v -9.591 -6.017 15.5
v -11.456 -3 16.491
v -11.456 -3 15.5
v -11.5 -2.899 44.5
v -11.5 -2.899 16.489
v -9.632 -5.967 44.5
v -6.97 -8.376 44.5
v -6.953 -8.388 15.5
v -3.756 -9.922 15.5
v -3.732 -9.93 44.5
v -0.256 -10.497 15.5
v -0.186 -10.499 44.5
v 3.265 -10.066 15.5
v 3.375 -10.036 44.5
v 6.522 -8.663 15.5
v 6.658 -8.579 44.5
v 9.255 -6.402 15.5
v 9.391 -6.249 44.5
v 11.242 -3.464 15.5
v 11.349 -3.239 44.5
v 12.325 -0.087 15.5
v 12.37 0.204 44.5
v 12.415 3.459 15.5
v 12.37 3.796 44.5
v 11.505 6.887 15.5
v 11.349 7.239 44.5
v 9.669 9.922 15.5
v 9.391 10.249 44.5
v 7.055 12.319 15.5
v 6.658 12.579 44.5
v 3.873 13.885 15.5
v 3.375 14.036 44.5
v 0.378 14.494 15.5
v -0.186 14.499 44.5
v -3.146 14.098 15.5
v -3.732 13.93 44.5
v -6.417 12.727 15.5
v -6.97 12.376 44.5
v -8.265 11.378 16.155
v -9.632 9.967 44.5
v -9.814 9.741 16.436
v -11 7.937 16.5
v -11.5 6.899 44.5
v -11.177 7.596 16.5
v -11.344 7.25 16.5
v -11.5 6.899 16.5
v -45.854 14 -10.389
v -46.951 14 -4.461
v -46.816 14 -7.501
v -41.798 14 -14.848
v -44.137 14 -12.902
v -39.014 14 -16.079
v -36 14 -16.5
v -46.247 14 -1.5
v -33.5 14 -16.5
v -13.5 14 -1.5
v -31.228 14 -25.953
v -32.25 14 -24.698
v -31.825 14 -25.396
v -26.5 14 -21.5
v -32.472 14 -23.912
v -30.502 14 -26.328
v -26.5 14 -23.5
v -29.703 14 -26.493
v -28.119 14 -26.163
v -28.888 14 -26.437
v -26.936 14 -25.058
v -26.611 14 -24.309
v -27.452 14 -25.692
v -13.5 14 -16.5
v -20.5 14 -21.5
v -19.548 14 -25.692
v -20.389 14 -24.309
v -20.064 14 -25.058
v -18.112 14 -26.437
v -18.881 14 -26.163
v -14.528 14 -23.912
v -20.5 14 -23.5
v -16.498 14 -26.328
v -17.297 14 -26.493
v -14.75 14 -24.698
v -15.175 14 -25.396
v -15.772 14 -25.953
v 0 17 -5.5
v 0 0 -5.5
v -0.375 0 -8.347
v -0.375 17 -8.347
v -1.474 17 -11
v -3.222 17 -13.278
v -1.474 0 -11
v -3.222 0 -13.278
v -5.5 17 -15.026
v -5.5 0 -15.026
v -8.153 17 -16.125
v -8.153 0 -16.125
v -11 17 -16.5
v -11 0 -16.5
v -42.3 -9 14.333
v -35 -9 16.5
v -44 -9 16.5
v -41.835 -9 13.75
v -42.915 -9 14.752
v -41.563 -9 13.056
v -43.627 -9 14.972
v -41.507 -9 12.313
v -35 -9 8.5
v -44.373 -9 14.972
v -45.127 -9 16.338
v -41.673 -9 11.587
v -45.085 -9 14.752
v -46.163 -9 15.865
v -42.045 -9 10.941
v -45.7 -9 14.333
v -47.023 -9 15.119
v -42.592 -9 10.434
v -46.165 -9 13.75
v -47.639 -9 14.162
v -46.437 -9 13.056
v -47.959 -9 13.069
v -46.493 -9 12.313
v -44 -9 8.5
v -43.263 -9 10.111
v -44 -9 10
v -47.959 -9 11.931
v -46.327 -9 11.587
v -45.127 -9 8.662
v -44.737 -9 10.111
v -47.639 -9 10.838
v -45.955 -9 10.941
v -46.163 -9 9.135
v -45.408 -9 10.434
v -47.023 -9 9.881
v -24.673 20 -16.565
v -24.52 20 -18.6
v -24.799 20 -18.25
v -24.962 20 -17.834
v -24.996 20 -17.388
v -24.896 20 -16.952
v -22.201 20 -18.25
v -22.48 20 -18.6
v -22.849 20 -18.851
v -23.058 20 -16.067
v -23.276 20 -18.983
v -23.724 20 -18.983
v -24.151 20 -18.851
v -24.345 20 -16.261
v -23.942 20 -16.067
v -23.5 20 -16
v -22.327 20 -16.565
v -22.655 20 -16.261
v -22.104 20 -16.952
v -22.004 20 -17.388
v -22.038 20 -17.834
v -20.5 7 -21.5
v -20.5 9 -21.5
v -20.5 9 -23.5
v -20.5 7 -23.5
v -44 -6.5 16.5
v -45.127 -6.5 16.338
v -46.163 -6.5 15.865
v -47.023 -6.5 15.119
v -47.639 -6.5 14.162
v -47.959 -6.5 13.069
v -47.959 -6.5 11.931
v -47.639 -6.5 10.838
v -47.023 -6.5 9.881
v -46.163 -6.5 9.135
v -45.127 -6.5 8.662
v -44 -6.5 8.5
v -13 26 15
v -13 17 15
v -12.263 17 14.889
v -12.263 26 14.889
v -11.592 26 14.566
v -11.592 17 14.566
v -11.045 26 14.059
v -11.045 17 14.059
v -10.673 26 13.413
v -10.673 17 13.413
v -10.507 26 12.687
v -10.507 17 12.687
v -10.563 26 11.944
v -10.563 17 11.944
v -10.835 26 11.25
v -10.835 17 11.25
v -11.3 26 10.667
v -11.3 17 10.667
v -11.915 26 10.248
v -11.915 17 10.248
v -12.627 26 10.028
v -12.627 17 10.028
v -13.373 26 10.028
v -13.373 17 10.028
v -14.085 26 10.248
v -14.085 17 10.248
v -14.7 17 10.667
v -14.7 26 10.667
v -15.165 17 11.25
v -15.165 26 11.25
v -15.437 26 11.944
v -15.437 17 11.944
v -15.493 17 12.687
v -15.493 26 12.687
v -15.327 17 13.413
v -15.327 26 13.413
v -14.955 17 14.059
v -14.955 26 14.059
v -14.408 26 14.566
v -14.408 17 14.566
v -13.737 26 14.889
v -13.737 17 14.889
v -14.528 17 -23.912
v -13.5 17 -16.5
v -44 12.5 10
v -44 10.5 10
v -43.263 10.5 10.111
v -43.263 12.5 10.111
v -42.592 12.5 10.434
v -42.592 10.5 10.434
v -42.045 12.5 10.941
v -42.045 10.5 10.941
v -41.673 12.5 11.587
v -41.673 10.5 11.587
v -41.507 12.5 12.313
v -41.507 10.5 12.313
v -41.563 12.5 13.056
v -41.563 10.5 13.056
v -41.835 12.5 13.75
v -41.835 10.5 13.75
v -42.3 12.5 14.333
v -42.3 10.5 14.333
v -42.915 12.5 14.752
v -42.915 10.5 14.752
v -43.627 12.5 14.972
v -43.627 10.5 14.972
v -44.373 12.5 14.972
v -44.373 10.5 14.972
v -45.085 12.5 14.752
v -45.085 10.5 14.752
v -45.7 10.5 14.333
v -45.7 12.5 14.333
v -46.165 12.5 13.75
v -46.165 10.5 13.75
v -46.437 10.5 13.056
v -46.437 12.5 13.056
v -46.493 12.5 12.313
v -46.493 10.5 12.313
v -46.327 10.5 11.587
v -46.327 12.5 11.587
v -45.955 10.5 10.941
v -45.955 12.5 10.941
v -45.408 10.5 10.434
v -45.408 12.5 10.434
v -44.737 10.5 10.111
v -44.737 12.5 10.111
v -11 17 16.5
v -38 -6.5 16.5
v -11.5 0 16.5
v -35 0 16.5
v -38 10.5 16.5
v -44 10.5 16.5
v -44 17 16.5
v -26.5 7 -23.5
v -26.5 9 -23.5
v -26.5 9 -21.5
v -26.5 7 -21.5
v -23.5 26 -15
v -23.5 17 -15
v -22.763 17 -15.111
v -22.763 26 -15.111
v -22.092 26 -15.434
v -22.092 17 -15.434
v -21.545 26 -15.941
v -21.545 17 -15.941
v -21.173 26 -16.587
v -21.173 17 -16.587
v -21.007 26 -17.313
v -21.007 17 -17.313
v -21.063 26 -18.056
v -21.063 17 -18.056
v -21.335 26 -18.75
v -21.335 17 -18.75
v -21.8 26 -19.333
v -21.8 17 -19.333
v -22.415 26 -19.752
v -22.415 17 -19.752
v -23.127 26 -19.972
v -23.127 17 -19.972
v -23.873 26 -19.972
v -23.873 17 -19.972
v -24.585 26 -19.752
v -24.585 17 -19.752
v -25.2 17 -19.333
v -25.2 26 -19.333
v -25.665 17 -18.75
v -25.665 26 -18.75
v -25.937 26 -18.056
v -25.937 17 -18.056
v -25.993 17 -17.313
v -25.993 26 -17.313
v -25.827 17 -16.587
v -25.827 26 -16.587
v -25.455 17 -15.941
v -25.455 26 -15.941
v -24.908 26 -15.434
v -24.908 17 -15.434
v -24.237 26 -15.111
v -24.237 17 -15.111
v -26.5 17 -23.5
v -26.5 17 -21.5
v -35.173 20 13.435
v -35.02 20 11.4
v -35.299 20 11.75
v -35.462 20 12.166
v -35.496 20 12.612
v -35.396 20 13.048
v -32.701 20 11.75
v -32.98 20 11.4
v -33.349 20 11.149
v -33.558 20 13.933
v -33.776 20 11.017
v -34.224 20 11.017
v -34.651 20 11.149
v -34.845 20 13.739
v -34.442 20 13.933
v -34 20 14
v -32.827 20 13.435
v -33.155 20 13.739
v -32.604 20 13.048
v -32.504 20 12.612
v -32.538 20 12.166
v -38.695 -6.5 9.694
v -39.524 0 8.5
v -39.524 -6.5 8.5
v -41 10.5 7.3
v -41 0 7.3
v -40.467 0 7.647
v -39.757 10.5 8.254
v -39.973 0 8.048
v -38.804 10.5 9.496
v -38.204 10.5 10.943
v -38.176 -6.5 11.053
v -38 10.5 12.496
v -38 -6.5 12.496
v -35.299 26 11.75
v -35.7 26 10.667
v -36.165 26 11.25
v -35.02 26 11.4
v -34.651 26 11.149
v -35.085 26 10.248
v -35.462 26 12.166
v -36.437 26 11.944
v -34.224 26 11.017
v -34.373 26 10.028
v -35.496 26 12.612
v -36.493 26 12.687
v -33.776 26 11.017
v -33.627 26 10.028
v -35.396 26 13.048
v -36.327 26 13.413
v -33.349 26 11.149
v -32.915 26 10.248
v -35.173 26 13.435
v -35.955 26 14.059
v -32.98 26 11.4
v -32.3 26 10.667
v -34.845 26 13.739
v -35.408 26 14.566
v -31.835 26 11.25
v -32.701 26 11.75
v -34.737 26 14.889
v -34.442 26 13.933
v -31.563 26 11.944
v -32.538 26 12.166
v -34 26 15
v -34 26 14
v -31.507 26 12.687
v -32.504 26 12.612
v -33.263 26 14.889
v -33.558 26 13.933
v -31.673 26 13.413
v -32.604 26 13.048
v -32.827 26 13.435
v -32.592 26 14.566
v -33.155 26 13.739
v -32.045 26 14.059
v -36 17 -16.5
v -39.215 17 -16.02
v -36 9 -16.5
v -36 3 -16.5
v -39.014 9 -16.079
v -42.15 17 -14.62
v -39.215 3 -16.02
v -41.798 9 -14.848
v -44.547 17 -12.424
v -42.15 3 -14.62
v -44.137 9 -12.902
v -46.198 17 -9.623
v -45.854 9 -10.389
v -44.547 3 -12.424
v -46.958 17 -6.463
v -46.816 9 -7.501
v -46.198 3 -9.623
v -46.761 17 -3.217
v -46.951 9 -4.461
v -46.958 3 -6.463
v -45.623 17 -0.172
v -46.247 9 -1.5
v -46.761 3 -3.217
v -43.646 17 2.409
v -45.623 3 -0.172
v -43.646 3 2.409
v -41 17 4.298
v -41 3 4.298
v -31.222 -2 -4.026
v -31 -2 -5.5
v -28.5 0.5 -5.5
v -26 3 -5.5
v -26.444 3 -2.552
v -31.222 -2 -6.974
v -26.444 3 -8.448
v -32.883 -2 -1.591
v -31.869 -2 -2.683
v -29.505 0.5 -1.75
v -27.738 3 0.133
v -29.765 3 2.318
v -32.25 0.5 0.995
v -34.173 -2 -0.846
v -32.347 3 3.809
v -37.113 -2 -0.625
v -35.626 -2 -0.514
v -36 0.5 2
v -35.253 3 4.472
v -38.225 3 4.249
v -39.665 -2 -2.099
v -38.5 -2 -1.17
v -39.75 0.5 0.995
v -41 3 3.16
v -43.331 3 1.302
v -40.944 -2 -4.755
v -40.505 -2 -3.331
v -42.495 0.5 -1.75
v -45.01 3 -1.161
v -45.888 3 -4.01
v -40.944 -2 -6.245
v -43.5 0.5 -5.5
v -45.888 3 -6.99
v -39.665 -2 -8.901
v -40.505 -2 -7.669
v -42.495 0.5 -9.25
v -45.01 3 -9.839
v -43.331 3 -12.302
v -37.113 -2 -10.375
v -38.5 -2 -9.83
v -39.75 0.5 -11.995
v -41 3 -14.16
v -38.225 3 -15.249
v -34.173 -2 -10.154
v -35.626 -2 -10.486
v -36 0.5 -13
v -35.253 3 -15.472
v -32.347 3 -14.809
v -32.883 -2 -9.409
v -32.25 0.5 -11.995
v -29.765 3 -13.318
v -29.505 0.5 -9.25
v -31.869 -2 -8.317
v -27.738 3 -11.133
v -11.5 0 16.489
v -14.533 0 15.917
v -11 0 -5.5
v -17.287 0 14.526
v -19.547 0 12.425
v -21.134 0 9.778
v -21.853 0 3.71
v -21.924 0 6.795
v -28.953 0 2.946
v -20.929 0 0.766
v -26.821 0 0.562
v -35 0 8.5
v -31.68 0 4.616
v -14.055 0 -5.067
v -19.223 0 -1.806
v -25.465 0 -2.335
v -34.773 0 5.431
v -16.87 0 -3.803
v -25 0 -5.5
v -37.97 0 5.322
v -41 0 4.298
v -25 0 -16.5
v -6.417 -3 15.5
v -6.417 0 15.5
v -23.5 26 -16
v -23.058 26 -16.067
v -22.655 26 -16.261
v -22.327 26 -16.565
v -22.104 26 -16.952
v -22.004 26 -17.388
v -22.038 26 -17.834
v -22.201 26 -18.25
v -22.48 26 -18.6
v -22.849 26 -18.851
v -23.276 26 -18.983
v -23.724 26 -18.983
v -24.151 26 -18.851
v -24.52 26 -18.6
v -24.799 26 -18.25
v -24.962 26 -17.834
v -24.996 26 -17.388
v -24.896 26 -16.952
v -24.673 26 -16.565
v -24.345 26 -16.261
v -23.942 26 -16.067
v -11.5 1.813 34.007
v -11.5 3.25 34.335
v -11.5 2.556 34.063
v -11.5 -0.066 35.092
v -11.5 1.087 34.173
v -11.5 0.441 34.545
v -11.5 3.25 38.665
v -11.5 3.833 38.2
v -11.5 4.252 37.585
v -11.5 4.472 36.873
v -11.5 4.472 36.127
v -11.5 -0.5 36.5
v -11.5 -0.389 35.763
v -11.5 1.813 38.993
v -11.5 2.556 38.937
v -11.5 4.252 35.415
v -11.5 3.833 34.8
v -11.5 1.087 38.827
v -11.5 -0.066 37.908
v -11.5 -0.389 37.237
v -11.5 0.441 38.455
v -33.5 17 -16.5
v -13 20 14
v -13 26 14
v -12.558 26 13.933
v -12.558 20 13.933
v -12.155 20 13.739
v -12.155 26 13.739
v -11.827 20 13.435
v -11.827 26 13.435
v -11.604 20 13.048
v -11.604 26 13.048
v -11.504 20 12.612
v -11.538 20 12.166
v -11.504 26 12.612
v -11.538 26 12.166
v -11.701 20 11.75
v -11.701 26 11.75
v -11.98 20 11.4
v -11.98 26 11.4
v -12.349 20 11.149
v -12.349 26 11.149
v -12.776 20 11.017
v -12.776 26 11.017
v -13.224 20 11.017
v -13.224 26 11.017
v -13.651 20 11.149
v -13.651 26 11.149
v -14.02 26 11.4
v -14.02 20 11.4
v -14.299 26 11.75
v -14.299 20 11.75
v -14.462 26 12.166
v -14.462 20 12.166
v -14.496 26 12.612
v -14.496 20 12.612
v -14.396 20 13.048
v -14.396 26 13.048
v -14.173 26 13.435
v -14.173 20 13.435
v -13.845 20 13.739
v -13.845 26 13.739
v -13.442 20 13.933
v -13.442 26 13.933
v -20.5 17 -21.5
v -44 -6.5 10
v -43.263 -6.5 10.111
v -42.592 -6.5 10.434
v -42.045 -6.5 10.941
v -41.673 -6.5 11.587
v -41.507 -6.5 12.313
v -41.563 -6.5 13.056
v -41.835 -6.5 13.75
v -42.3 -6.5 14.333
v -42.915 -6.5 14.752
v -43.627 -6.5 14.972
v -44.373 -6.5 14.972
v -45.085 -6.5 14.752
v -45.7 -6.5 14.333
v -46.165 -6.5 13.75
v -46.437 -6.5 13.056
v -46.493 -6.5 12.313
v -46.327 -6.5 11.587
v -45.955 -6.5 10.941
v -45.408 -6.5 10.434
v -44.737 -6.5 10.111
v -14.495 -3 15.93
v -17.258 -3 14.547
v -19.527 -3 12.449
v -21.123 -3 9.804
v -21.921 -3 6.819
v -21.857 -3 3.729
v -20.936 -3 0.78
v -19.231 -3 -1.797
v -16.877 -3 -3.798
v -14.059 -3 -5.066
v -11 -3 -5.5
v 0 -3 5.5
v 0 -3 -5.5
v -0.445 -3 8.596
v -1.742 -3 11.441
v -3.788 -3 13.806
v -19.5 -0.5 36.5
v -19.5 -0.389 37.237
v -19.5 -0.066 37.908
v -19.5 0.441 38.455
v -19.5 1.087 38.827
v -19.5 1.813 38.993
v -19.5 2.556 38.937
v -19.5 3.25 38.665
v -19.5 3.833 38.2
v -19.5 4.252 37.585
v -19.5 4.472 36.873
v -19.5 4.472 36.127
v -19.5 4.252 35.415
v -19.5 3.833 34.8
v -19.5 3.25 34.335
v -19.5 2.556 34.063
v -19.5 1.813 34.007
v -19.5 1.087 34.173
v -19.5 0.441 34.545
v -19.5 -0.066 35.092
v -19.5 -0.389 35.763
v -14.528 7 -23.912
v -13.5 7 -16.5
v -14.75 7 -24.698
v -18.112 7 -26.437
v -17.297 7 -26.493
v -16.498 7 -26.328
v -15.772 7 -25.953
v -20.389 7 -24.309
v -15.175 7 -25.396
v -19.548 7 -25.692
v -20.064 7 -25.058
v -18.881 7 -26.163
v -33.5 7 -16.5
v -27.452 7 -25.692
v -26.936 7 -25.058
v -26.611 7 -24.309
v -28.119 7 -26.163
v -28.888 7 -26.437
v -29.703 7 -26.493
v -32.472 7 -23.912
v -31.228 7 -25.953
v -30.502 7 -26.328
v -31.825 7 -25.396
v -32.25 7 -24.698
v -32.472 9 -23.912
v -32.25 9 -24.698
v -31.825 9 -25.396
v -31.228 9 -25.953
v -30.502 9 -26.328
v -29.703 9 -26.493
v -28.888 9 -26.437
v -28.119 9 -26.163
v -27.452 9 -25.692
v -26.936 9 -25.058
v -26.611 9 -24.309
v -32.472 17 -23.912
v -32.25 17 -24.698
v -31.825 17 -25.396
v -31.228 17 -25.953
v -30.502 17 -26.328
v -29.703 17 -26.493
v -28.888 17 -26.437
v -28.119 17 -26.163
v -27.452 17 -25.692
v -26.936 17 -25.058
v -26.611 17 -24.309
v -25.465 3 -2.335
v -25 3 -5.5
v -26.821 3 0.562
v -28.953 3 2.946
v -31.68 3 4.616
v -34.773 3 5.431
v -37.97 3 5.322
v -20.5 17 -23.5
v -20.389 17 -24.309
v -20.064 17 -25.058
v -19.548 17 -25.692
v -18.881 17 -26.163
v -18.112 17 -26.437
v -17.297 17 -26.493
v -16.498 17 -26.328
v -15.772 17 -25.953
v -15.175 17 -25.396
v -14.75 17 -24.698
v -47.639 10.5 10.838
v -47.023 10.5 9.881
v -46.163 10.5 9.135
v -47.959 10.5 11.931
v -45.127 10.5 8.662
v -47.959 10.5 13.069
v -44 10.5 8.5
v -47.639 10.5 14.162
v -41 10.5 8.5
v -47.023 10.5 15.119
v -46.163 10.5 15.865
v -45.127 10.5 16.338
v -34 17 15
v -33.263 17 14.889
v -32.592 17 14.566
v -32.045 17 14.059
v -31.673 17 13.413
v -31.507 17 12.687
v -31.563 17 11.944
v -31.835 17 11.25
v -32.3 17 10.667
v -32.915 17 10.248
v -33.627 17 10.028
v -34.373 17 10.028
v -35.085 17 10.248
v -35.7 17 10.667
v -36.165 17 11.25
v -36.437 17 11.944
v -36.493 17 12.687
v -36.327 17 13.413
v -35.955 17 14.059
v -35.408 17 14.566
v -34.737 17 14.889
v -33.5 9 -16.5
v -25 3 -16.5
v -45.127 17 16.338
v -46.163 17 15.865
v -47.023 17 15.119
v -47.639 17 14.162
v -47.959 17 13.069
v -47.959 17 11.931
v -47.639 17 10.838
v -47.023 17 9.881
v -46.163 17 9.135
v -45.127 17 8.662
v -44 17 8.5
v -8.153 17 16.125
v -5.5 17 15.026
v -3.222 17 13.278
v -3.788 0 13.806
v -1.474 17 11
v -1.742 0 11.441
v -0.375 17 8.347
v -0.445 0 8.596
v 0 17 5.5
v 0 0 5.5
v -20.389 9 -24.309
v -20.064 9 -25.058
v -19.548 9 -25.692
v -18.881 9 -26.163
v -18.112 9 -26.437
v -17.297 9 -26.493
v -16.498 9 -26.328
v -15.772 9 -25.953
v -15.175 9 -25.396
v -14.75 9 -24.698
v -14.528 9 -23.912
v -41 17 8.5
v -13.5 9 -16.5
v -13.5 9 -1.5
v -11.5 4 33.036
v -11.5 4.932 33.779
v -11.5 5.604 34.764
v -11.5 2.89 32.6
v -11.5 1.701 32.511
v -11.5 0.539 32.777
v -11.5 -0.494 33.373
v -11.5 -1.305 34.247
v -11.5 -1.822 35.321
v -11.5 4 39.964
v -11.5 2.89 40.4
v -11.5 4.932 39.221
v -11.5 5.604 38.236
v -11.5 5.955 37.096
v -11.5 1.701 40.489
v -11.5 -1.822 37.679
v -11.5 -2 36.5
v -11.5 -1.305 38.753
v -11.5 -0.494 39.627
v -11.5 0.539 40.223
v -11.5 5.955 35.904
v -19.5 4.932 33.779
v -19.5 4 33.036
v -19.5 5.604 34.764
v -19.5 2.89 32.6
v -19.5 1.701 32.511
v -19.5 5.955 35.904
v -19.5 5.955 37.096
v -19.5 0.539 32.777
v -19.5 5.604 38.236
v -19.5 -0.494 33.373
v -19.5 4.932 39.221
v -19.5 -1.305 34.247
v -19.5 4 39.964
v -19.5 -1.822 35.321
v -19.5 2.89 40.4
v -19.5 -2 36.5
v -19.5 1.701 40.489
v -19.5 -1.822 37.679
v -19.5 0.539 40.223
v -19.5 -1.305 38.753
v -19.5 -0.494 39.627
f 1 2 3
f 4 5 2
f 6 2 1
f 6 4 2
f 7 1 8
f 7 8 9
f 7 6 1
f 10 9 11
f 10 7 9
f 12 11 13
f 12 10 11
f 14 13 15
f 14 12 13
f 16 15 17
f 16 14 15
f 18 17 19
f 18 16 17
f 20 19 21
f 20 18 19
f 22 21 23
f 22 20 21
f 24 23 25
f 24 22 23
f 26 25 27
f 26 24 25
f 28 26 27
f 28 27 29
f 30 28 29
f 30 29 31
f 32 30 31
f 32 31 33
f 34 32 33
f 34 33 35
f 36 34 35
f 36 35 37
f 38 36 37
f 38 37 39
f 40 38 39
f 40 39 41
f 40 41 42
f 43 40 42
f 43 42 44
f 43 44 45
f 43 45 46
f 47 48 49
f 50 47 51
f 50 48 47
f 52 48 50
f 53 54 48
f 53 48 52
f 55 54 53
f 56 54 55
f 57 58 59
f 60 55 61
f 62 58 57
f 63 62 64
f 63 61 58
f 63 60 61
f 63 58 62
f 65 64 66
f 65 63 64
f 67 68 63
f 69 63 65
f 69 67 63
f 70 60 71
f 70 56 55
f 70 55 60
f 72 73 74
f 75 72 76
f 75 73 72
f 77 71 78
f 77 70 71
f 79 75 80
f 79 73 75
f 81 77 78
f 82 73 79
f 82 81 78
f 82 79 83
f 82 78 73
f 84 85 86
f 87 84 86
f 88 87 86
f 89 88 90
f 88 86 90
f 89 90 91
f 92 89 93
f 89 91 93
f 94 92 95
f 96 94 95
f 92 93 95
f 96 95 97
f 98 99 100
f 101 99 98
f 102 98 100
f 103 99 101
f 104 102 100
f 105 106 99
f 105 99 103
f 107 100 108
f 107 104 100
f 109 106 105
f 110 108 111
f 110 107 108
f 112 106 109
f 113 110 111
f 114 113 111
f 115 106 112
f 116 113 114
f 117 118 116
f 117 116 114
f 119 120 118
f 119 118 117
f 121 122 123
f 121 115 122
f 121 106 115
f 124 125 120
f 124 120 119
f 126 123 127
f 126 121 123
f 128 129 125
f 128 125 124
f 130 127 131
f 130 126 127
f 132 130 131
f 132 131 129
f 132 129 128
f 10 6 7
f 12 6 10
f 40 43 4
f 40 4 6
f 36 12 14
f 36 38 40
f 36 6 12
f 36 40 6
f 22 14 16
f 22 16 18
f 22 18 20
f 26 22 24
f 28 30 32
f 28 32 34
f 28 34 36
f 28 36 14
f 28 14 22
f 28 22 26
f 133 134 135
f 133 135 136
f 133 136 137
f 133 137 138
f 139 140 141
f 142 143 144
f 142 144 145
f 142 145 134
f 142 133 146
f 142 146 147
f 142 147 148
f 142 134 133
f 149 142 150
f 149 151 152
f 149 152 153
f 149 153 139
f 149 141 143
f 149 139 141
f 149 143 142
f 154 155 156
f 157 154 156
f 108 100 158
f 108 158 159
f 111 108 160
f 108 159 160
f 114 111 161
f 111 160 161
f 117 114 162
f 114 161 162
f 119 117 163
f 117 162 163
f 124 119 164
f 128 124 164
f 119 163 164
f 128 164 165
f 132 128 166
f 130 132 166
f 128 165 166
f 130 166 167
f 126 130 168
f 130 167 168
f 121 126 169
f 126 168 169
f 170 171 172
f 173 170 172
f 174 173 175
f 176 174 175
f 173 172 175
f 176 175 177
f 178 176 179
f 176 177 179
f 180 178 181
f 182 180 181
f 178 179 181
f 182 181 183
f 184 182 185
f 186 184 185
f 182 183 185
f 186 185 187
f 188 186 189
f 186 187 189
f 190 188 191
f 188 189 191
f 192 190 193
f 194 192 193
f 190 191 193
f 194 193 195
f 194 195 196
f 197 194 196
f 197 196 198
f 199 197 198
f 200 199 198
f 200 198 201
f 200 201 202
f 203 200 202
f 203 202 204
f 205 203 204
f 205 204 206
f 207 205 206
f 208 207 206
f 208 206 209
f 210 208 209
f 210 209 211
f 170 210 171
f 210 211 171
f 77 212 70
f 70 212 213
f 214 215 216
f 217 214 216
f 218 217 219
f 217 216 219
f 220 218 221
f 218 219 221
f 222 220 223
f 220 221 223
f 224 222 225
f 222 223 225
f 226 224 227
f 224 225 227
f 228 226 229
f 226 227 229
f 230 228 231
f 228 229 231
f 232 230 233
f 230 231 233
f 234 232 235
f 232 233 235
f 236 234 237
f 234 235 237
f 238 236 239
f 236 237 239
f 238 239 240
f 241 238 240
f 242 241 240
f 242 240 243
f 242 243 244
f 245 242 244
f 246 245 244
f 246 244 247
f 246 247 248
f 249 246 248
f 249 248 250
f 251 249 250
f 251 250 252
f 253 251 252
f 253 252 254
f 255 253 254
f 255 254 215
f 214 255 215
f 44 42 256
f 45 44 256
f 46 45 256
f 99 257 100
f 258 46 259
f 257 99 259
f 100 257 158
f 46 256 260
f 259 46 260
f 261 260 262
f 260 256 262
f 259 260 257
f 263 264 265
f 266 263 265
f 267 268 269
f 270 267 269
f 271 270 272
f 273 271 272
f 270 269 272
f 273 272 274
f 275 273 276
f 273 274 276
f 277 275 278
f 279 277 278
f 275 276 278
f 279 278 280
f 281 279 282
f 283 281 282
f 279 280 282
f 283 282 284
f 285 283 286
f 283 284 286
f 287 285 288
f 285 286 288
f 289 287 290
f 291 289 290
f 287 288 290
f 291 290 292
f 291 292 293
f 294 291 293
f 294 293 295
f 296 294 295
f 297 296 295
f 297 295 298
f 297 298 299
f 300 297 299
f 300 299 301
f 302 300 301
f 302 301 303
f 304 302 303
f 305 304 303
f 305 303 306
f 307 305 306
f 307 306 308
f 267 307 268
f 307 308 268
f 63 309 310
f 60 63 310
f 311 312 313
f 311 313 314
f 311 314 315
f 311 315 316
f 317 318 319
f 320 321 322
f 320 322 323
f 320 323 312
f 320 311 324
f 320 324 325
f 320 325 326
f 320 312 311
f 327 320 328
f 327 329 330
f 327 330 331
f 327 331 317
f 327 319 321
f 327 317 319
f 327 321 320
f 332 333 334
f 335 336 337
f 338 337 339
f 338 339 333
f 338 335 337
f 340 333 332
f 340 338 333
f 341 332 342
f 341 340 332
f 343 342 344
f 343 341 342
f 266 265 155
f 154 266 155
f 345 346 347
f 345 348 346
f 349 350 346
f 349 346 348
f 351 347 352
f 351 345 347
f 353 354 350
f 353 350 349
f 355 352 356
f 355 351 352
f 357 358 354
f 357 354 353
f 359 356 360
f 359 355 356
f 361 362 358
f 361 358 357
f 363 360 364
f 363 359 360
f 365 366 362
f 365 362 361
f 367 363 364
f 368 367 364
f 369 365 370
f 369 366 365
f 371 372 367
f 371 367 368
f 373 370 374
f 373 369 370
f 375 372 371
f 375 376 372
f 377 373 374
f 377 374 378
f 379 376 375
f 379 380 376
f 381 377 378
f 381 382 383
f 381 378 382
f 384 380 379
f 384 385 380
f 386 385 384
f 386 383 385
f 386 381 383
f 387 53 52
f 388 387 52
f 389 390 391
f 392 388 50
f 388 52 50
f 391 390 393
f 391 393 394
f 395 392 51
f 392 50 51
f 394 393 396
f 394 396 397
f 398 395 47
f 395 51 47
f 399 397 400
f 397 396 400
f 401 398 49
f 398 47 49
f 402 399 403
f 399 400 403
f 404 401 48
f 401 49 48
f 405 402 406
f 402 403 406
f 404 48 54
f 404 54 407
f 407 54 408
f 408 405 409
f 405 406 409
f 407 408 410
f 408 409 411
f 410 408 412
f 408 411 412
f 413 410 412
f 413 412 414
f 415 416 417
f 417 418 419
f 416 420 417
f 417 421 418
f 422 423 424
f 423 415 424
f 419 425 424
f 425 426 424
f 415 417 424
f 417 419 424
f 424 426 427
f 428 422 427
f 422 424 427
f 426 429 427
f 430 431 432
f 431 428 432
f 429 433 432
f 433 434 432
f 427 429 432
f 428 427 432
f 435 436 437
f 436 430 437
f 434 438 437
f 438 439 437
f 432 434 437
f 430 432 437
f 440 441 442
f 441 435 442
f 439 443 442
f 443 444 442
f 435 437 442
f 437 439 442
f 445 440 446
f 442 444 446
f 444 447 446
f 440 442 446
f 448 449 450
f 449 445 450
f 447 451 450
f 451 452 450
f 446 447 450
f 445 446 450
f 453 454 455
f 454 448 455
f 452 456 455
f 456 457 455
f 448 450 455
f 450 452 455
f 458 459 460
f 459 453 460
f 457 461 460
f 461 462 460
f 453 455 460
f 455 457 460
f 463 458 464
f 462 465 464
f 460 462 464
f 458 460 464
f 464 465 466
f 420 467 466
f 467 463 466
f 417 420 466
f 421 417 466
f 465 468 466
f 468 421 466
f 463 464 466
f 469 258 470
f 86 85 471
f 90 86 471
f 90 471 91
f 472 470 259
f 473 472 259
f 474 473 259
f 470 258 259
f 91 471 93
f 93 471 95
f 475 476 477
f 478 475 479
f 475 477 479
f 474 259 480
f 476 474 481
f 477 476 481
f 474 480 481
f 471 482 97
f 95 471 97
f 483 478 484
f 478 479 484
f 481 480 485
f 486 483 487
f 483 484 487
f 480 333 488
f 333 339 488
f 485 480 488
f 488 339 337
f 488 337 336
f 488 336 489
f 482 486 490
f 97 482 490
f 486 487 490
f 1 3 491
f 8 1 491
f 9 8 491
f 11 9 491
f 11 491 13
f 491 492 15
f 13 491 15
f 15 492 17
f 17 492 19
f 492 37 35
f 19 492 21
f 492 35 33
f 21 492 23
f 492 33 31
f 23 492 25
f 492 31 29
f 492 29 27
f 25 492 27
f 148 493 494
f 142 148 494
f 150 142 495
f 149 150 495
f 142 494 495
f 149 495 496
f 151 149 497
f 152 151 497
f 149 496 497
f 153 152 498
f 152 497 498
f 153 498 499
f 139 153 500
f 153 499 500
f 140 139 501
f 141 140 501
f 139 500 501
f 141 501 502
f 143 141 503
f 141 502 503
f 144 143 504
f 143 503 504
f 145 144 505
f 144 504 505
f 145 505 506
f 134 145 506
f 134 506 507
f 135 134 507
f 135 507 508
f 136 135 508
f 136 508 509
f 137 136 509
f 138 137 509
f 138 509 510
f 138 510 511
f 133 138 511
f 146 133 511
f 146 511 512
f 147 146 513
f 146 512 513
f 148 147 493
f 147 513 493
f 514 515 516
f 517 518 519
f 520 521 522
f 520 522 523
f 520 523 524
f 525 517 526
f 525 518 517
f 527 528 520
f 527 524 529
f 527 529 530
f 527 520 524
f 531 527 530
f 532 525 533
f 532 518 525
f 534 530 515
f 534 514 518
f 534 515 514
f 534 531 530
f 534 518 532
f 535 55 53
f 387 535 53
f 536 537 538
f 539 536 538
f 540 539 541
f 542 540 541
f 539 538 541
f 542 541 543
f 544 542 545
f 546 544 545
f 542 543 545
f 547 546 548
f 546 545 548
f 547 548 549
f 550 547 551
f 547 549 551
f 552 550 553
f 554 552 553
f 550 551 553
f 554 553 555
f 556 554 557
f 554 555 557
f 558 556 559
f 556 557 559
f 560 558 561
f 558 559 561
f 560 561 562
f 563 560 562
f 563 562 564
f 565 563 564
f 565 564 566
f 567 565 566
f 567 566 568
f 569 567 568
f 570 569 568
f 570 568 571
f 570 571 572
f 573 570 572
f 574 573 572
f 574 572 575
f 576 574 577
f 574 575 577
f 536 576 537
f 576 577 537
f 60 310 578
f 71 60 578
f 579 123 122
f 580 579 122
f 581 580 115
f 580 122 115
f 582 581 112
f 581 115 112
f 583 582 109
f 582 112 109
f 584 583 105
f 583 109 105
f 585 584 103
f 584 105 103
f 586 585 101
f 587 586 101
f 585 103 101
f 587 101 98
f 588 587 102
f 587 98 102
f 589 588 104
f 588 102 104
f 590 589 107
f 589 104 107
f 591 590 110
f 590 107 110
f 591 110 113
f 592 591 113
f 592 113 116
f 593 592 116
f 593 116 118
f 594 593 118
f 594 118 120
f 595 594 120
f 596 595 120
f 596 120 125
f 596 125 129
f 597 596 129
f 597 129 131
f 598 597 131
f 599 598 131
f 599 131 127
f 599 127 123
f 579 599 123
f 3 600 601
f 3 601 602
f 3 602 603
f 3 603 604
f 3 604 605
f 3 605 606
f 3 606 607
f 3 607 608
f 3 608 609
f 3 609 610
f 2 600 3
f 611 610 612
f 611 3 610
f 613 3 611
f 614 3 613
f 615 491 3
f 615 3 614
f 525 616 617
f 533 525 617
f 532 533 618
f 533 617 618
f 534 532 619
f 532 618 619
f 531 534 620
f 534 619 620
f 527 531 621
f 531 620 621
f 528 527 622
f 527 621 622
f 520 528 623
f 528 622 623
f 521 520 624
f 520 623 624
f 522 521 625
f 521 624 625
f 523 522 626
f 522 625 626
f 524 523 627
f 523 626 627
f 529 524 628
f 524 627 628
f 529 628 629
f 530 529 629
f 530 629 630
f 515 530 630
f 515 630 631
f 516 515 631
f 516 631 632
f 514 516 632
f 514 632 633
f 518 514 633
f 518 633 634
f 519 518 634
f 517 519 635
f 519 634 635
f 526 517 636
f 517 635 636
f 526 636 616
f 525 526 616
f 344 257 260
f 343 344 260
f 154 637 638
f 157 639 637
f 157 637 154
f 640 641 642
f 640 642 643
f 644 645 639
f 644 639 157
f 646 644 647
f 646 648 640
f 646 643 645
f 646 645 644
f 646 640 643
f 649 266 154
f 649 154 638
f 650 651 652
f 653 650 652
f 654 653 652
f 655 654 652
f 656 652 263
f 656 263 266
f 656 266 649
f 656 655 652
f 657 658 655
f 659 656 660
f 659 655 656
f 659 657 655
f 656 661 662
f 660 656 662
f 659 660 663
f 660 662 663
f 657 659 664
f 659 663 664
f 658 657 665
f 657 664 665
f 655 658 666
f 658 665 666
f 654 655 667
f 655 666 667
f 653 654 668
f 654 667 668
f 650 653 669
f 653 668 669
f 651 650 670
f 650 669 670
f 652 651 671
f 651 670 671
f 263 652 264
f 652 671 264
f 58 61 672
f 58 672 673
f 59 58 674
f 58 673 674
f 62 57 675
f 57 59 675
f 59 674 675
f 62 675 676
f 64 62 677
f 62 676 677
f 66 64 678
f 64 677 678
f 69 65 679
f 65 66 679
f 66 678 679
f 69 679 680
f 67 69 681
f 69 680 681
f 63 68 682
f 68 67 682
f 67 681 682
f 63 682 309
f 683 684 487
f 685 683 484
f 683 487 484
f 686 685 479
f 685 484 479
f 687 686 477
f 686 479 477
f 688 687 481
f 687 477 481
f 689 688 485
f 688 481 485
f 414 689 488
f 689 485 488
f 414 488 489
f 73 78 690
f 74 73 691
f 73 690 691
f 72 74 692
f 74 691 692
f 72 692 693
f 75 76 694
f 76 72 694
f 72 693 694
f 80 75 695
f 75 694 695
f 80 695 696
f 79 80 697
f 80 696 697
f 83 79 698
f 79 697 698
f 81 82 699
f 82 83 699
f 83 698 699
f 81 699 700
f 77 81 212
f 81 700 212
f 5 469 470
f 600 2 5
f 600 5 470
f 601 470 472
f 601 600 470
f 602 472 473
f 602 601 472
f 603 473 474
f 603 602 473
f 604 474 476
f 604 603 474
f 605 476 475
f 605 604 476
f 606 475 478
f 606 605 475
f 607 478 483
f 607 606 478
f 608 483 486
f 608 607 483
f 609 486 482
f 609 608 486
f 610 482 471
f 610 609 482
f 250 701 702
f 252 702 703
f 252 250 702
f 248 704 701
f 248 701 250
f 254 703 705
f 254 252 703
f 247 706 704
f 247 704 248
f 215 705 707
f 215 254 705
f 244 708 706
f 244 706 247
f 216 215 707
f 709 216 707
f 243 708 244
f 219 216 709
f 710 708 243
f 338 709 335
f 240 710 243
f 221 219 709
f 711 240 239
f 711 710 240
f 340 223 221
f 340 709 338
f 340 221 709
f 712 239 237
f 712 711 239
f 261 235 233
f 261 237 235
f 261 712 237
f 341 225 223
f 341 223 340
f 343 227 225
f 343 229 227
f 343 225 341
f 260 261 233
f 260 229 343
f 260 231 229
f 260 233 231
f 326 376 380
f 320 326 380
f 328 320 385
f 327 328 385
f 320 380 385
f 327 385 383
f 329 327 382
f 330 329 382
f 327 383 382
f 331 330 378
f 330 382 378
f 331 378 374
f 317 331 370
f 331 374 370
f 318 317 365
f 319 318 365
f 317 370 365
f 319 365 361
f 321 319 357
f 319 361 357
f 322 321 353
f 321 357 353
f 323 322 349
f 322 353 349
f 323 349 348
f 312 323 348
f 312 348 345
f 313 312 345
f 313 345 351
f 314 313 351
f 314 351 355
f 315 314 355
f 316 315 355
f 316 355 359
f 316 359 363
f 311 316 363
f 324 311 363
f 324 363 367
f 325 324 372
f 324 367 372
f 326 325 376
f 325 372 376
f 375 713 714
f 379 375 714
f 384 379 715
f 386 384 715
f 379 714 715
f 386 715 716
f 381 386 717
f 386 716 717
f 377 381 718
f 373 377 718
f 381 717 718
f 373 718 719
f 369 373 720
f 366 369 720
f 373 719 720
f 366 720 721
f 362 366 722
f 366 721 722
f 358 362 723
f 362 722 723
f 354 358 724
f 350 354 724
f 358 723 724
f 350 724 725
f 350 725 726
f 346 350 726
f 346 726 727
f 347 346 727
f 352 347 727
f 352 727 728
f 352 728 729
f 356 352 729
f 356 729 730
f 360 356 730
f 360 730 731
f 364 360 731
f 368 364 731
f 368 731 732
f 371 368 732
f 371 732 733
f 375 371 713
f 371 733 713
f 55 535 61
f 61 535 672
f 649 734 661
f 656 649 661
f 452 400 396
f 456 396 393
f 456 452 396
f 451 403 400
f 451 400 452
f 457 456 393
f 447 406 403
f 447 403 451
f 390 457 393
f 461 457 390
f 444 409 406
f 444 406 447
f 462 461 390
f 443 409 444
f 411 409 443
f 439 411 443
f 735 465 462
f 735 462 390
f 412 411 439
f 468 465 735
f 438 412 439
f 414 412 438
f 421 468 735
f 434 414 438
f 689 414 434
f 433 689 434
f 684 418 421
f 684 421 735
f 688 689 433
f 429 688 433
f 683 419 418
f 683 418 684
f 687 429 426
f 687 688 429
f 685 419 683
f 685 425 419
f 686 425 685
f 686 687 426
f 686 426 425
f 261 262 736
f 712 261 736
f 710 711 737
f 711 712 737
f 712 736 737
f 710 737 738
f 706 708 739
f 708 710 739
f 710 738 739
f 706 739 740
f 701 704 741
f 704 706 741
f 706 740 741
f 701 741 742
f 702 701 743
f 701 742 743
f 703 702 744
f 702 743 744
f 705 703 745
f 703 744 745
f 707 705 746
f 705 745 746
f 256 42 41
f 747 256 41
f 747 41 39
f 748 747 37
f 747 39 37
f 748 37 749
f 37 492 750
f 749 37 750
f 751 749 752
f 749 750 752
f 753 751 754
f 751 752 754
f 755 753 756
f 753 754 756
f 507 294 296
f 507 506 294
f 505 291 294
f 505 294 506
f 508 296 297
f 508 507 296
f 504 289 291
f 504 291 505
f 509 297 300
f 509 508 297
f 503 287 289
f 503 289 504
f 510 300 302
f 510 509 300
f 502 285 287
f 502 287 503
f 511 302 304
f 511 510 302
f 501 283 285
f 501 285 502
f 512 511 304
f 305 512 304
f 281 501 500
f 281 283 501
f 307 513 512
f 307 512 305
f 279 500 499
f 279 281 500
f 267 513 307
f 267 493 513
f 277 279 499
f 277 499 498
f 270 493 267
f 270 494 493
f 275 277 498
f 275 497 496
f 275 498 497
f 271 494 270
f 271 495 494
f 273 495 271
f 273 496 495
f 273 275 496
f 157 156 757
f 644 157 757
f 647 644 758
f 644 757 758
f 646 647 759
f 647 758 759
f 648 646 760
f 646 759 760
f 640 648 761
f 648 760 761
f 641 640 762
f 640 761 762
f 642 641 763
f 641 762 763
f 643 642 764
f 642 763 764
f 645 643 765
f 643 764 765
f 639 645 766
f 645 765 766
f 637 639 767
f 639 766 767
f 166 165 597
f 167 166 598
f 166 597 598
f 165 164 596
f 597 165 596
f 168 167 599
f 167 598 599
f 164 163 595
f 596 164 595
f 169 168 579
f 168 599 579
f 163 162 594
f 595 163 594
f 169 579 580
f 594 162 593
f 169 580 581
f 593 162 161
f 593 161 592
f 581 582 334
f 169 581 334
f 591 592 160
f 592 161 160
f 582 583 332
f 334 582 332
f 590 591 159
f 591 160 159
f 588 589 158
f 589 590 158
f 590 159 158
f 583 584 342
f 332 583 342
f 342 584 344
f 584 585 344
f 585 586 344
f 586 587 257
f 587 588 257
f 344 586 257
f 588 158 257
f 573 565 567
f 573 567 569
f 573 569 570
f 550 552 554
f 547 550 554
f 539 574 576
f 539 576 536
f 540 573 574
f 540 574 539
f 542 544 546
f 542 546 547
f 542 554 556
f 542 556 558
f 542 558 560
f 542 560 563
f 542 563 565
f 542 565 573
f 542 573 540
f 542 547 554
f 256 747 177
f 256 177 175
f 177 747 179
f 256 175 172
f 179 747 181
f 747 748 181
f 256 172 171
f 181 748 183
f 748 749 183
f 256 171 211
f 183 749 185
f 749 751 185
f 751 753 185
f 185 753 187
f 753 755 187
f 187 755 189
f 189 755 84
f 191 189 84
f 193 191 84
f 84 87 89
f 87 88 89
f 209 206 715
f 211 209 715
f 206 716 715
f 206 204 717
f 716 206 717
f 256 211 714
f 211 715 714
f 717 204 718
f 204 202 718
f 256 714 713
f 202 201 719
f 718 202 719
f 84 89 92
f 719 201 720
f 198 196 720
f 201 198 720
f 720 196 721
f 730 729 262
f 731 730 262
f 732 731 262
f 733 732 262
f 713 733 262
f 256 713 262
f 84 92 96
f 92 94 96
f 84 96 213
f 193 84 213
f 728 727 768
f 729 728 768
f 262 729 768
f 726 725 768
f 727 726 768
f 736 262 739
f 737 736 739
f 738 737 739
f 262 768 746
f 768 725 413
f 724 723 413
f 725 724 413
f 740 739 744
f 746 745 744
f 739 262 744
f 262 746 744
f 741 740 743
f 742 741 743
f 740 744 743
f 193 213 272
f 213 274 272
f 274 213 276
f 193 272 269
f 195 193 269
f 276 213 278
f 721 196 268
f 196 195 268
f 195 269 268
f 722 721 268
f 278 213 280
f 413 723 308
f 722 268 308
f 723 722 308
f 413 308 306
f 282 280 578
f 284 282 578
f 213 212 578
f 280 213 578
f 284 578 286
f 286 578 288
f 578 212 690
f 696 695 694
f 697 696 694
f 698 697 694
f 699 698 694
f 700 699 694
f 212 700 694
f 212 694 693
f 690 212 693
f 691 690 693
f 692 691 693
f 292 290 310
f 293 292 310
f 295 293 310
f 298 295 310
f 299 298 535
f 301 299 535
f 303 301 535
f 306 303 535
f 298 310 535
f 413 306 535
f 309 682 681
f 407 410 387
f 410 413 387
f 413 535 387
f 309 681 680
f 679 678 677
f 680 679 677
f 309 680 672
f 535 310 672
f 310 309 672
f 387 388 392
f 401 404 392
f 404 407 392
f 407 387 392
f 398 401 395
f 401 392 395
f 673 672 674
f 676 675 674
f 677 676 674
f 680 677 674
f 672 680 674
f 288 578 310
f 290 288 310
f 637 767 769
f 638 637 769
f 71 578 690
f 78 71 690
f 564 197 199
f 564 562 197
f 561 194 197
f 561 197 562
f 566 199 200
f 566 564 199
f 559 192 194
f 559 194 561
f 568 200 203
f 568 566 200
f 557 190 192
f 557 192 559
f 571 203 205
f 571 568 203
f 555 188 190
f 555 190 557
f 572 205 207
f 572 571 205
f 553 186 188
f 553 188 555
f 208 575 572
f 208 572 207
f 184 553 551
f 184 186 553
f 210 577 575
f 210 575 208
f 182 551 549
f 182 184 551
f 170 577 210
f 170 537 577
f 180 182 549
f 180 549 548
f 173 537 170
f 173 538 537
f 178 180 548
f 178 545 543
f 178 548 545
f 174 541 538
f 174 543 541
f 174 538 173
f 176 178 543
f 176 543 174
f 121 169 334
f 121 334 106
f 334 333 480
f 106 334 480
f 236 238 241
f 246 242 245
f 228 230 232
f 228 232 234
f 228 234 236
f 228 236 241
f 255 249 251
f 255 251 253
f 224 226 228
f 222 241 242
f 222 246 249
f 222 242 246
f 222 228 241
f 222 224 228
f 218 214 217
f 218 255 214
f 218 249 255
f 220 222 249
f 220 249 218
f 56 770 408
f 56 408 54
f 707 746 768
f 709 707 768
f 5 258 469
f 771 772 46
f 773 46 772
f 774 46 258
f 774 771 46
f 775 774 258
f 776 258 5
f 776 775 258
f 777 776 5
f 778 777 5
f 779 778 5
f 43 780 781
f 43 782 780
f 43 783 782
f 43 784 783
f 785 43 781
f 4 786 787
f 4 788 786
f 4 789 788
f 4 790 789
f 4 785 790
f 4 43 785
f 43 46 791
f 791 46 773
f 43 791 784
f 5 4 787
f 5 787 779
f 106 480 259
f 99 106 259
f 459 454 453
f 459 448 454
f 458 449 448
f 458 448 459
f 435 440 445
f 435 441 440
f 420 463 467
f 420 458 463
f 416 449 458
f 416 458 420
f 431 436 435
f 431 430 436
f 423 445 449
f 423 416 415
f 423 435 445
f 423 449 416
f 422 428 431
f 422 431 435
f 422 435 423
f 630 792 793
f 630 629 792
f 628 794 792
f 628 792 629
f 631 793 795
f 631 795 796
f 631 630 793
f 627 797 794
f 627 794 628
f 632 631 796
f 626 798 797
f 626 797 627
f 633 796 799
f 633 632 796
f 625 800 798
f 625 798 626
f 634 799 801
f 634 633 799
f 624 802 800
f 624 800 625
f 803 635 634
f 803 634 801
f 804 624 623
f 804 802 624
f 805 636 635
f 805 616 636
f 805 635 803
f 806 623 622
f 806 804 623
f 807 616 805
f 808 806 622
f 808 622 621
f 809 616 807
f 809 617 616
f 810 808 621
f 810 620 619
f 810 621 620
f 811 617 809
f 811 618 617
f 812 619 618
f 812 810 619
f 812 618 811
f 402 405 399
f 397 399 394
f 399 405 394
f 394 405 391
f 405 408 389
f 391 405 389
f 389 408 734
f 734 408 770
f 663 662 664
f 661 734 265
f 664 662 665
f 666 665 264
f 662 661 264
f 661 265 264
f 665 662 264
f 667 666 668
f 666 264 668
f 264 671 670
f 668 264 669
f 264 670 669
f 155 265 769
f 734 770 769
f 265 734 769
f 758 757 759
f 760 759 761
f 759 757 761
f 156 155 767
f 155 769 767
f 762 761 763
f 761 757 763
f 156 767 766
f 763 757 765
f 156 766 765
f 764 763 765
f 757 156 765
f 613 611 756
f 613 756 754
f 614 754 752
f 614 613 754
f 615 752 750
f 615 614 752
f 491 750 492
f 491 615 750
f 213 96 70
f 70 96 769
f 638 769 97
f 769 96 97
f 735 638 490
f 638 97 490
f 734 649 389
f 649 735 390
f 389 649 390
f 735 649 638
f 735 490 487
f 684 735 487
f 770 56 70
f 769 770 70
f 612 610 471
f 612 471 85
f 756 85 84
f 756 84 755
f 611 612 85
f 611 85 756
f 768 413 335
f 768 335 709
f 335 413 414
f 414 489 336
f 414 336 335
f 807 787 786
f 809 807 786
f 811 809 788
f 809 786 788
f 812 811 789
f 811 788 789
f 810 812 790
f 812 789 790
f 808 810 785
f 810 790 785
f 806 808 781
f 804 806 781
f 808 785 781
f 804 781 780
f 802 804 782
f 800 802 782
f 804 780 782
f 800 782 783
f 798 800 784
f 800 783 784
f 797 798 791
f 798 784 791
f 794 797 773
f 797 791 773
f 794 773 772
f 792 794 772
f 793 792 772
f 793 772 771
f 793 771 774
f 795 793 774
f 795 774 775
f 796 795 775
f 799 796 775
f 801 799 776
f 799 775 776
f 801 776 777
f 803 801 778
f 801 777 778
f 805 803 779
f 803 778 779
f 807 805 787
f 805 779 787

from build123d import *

# Parameters (mm, degrees)
BOSS_EXTRUDE1_DEPTH = 17
BOSS_EXTRUDE2_DEPTH = 10
BOSS_EXTRUDE3_DEPTH = 29
SKETCH6_R           = 4
BOSS_EXTRUDE4_DEPTH = 8
BOSS_EXTRUDE5_DEPTH = 26
SKETCH11_R          = 2.5
BOSS_EXTRUDE6_DEPTH = 9
BOSS_EXTRUDE8_START = 3
BOSS_EXTRUDE8_DEPTH = 3
CUT_EXTRUDE1_DEPTH  = 3
BOSS_EXTRUDE7_START = 2
SKETCH12_R          = 5
BOSS_EXTRUDE7_DEPTH = 5
BOSS_EXTRUDE7_TAPER = -45
SKETCH10_W          = 10
SKETCH10_H          = 17
CUT_EXTRUDE2_DEPTH  = 9.2
CUT_EXTRUDE3_START  = -13.5
SKETCH14_W          = 25
SKETCH14_H          = 5
CUT_EXTRUDE3_DEPTH  = 57.929042368
SKETCH15_R          = 2.5
CUT_EXTRUDE4_DEPTH  = 8
SKETCH16_R          = 1.5
CUT_EXTRUDE5_DEPTH  = 6
SKETCH17_R          = 2.5
CUT_EXTRUDE6_DEPTH  = 21.5
FILLET1_R           = 6


with BuildPart() as part:
    # Sketch1 → Boss-Extrude1 (new body)
    with BuildSketch(Plane(origin=(0, 0, 0), x_dir=(1, 0, 0), z_dir=(0, 1, 0))):
        with BuildLine():
            Line((-11, 16.5), (-36, 16.5))
            ThreePointArc((-36, 16.5), (-46.695268783, 8.071230378), (-41, -4.297958971))
            Line((-41, -4.297958971), (-41, -16.5))
            Line((-41, -16.5), (-11, -16.5))
            ThreePointArc((-11, -16.5), (-3.221825407, -13.278174593), (0, -5.5))
            Line((0, -5.5), (0, 5.5))
            ThreePointArc((0, 5.5), (-3.221825407, 13.278174593), (-11, 16.5))
        make_face()
    extrude(amount=BOSS_EXTRUDE1_DEPTH)

    # Sketch2 → Boss-Extrude2 (add)
    with BuildSketch(Plane(origin=(0, 17, 0), x_dir=(1, 0, 0), z_dir=(0, 1, 0))):
        with BuildLine():
            Line((-33.5, 16.5), (-32.471532465, 23.912304266))
            ThreePointArc((-32.471532465, 23.912304266), (-29.293357066, 26.492874655), (-26.5, 23.5))
            Line((-26.5, 23.5), (-26.5, 21.5))
            Line((-26.5, 21.5), (-20.5, 21.5))
            Line((-20.5, 21.5), (-20.5, 23.5))
            ThreePointArc((-20.5, 23.5), (-17.706642934, 26.492874655), (-14.528467535, 23.912304266))
            Line((-14.528467535, 23.912304266), (-13.5, 16.5))
            Line((-13.5, 16.5), (-33.5, 16.5))
        make_face()
    extrude(amount=-BOSS_EXTRUDE2_DEPTH)

    # Sketch5 → Boss-Extrude3 (add)
    with BuildSketch(Plane.XY.offset(44.5)):
        with BuildLine():
            Line((-11.5, 6.898979486), (-11.5, -2.898979486))
            ThreePointArc((-11.5, -2.898979486), (12.5, 2), (-11.5, 6.898979486))
        make_face()
    extrude(amount=-BOSS_EXTRUDE3_DEPTH)

    # Sketch6 → Boss-Extrude4 (add)
    with BuildSketch(Plane.ZY.offset(11.5)):
        with Locations(Location((36.5, 2, 0), (0, 0, 270))):
            Circle(SKETCH6_R)
    extrude(amount=BOSS_EXTRUDE4_DEPTH)

    # Sketch7 → Boss-Extrude5 (add)
    with BuildSketch(Plane(origin=(0, 17, 0), x_dir=(1, 0, 0), z_dir=(0, 1, 0))):
        with BuildLine():
            Line((-44, -8.5), (-35, -8.5))
            Line((-35, -8.5), (-35, -16.5))
            Line((-35, -16.5), (-44, -16.5))
            ThreePointArc((-44, -16.5), (-48, -12.5), (-44, -8.5))
        make_face()
    extrude(amount=-BOSS_EXTRUDE5_DEPTH)

    # Sketch11 → Boss-Extrude6 (add)
    with BuildSketch(Plane(origin=(0, 17, 0), x_dir=(1, 0, 0), z_dir=(0, 1, 0))):
        with Locations(Location((-23.5, 17.5, 0), (0, 0, 270))):
            Circle(SKETCH11_R)
        with Locations(Location((-34, -12.5, 0), (0, 0, 270))):
            Circle(SKETCH11_R)
        with Locations(Location((-13, -12.5, 0), (0, 0, 270))):
            Circle(SKETCH11_R)
    extrude(amount=BOSS_EXTRUDE6_DEPTH)

    # Sketch13 → Boss-Extrude8 (add)
    with BuildSketch(Plane.XZ.offset(BOSS_EXTRUDE8_START)):
        with BuildLine():
            Line((-11, -5.5), (0, -5.5))
            Line((0, -5.5), (0, 5.5))
            ThreePointArc((0, 5.5), (-18.778174593, 13.278174593), (-11, -5.5))
        make_face()
    extrude(amount=-BOSS_EXTRUDE8_DEPTH)

    # Sketch9 → Cut-Extrude1 (cut)
    with BuildSketch(Plane.XZ):
        with BuildLine():
            Line((-25, -16.5), (-25, -5.5))
            ThreePointArc((-25, -5.5), (-43.778174593, 2.278174593), (-36, -16.5))
            Line((-36, -16.5), (-25, -16.5))
        make_face()
    extrude(amount=-CUT_EXTRUDE1_DEPTH, mode=Mode.SUBTRACT)

    # Sketch12 → Boss-Extrude7 (add)
    with BuildSketch(Plane.XZ.offset(BOSS_EXTRUDE7_START)):
        with Locations((-36, -5.5)):
            Circle(SKETCH12_R)
    extrude(amount=-BOSS_EXTRUDE7_DEPTH, taper=BOSS_EXTRUDE7_TAPER)

    # Sketch10 → Cut-Extrude2 (cut)
    with BuildSketch(Plane.XY.offset(16.5)):
        with Locations((-43, 2)):
            Rectangle(SKETCH10_W, SKETCH10_H)
    extrude(amount=-CUT_EXTRUDE2_DEPTH, mode=Mode.SUBTRACT)

    # Sketch14 → Cut-Extrude3 (cut, through all)
    with BuildSketch(Plane(origin=(0, 0, 0), x_dir=(0, 0, -1), z_dir=(1, 0, 0)).offset(CUT_EXTRUDE3_START)):
        with Locations((14, 11.5)):
            Rectangle(SKETCH14_W, SKETCH14_H)
    extrude(amount=-CUT_EXTRUDE3_DEPTH, mode=Mode.SUBTRACT)

    # Sketch15 → Cut-Extrude4 (cut)
    with BuildSketch(Plane.ZY.offset(19.5)):
        with Locations(Location((36.5, 2, 0), (0, 0, 270))):
            Circle(SKETCH15_R)
    extrude(amount=-CUT_EXTRUDE4_DEPTH, mode=Mode.SUBTRACT)

    # Sketch16 → Cut-Extrude5 (cut)
    with BuildSketch(Plane(origin=(0, 26, 0), x_dir=(1, 0, 0), z_dir=(0, 1, 0))):
        with Locations(Location((-23.5, 17.5, 0), (0, 0, 270))):
            Circle(SKETCH16_R)
        with Locations(Location((-34, -12.5, 0), (0, 0, 270))):
            Circle(SKETCH16_R)
        with Locations(Location((-13, -12.5, 0), (0, 0, 270))):
            Circle(SKETCH16_R)
    extrude(amount=-CUT_EXTRUDE5_DEPTH, mode=Mode.SUBTRACT)

    # Sketch17 → Cut-Extrude6 (cut)
    with BuildSketch(Plane.XZ.offset(9)):
        with Locations(Location((-44, 12.5, 0), (0, 0, 270))):
            Circle(SKETCH17_R)
    extrude(amount=-CUT_EXTRUDE6_DEPTH, mode=Mode.SUBTRACT)

    # Fillet1
    # the kernel refuses this fillet: 6 mm, written as the material it adds along each edge
    with BuildSketch(Plane(origin=(-38, 10.5, 7.3), x_dir=(0, 0, 1), z_dir=(0, -1, 0))) as fillet1_piece_1_section:
        with BuildLine():
            CenterArc((5.196152423, 6), FILLET1_R, 210, 60)
            Line((0, 3), (0, 0))
            Line((0, 0), (5.196152423, 0))
        make_face()
    fillet1_piece_1 = extrude(amount=23.490381057, mode=Mode.PRIVATE)
    fillet1_piece_1 = split(fillet1_piece_1, bisect_by=Plane(origin=(-38.38283384, 5.25, 8.5), z_dir=(0, 0, 1)), keep=Keep.TOP, mode=Mode.PRIVATE)
    fillet1_piece_1 = split(fillet1_piece_1, bisect_by=Plane(origin=(-38.38283384, -9, 10.353353241), z_dir=(0, 1, 0)), keep=Keep.TOP, mode=Mode.PRIVATE)
    add(fillet1_piece_1)
    with BuildSketch(Plane(origin=(-38, 10.5, 7.3), x_dir=(0, 0, 1), z_dir=(0, -1, 0))) as fillet1_piece_2:
        with BuildLine():
            CenterArc((5.196152423, 6), FILLET1_R, 210, 60)
            Line((0, 3), (0, 0))
            Line((0, 0), (5.196152423, 0))
        make_face()
    extrude(amount=10.5)


solid = part.part
